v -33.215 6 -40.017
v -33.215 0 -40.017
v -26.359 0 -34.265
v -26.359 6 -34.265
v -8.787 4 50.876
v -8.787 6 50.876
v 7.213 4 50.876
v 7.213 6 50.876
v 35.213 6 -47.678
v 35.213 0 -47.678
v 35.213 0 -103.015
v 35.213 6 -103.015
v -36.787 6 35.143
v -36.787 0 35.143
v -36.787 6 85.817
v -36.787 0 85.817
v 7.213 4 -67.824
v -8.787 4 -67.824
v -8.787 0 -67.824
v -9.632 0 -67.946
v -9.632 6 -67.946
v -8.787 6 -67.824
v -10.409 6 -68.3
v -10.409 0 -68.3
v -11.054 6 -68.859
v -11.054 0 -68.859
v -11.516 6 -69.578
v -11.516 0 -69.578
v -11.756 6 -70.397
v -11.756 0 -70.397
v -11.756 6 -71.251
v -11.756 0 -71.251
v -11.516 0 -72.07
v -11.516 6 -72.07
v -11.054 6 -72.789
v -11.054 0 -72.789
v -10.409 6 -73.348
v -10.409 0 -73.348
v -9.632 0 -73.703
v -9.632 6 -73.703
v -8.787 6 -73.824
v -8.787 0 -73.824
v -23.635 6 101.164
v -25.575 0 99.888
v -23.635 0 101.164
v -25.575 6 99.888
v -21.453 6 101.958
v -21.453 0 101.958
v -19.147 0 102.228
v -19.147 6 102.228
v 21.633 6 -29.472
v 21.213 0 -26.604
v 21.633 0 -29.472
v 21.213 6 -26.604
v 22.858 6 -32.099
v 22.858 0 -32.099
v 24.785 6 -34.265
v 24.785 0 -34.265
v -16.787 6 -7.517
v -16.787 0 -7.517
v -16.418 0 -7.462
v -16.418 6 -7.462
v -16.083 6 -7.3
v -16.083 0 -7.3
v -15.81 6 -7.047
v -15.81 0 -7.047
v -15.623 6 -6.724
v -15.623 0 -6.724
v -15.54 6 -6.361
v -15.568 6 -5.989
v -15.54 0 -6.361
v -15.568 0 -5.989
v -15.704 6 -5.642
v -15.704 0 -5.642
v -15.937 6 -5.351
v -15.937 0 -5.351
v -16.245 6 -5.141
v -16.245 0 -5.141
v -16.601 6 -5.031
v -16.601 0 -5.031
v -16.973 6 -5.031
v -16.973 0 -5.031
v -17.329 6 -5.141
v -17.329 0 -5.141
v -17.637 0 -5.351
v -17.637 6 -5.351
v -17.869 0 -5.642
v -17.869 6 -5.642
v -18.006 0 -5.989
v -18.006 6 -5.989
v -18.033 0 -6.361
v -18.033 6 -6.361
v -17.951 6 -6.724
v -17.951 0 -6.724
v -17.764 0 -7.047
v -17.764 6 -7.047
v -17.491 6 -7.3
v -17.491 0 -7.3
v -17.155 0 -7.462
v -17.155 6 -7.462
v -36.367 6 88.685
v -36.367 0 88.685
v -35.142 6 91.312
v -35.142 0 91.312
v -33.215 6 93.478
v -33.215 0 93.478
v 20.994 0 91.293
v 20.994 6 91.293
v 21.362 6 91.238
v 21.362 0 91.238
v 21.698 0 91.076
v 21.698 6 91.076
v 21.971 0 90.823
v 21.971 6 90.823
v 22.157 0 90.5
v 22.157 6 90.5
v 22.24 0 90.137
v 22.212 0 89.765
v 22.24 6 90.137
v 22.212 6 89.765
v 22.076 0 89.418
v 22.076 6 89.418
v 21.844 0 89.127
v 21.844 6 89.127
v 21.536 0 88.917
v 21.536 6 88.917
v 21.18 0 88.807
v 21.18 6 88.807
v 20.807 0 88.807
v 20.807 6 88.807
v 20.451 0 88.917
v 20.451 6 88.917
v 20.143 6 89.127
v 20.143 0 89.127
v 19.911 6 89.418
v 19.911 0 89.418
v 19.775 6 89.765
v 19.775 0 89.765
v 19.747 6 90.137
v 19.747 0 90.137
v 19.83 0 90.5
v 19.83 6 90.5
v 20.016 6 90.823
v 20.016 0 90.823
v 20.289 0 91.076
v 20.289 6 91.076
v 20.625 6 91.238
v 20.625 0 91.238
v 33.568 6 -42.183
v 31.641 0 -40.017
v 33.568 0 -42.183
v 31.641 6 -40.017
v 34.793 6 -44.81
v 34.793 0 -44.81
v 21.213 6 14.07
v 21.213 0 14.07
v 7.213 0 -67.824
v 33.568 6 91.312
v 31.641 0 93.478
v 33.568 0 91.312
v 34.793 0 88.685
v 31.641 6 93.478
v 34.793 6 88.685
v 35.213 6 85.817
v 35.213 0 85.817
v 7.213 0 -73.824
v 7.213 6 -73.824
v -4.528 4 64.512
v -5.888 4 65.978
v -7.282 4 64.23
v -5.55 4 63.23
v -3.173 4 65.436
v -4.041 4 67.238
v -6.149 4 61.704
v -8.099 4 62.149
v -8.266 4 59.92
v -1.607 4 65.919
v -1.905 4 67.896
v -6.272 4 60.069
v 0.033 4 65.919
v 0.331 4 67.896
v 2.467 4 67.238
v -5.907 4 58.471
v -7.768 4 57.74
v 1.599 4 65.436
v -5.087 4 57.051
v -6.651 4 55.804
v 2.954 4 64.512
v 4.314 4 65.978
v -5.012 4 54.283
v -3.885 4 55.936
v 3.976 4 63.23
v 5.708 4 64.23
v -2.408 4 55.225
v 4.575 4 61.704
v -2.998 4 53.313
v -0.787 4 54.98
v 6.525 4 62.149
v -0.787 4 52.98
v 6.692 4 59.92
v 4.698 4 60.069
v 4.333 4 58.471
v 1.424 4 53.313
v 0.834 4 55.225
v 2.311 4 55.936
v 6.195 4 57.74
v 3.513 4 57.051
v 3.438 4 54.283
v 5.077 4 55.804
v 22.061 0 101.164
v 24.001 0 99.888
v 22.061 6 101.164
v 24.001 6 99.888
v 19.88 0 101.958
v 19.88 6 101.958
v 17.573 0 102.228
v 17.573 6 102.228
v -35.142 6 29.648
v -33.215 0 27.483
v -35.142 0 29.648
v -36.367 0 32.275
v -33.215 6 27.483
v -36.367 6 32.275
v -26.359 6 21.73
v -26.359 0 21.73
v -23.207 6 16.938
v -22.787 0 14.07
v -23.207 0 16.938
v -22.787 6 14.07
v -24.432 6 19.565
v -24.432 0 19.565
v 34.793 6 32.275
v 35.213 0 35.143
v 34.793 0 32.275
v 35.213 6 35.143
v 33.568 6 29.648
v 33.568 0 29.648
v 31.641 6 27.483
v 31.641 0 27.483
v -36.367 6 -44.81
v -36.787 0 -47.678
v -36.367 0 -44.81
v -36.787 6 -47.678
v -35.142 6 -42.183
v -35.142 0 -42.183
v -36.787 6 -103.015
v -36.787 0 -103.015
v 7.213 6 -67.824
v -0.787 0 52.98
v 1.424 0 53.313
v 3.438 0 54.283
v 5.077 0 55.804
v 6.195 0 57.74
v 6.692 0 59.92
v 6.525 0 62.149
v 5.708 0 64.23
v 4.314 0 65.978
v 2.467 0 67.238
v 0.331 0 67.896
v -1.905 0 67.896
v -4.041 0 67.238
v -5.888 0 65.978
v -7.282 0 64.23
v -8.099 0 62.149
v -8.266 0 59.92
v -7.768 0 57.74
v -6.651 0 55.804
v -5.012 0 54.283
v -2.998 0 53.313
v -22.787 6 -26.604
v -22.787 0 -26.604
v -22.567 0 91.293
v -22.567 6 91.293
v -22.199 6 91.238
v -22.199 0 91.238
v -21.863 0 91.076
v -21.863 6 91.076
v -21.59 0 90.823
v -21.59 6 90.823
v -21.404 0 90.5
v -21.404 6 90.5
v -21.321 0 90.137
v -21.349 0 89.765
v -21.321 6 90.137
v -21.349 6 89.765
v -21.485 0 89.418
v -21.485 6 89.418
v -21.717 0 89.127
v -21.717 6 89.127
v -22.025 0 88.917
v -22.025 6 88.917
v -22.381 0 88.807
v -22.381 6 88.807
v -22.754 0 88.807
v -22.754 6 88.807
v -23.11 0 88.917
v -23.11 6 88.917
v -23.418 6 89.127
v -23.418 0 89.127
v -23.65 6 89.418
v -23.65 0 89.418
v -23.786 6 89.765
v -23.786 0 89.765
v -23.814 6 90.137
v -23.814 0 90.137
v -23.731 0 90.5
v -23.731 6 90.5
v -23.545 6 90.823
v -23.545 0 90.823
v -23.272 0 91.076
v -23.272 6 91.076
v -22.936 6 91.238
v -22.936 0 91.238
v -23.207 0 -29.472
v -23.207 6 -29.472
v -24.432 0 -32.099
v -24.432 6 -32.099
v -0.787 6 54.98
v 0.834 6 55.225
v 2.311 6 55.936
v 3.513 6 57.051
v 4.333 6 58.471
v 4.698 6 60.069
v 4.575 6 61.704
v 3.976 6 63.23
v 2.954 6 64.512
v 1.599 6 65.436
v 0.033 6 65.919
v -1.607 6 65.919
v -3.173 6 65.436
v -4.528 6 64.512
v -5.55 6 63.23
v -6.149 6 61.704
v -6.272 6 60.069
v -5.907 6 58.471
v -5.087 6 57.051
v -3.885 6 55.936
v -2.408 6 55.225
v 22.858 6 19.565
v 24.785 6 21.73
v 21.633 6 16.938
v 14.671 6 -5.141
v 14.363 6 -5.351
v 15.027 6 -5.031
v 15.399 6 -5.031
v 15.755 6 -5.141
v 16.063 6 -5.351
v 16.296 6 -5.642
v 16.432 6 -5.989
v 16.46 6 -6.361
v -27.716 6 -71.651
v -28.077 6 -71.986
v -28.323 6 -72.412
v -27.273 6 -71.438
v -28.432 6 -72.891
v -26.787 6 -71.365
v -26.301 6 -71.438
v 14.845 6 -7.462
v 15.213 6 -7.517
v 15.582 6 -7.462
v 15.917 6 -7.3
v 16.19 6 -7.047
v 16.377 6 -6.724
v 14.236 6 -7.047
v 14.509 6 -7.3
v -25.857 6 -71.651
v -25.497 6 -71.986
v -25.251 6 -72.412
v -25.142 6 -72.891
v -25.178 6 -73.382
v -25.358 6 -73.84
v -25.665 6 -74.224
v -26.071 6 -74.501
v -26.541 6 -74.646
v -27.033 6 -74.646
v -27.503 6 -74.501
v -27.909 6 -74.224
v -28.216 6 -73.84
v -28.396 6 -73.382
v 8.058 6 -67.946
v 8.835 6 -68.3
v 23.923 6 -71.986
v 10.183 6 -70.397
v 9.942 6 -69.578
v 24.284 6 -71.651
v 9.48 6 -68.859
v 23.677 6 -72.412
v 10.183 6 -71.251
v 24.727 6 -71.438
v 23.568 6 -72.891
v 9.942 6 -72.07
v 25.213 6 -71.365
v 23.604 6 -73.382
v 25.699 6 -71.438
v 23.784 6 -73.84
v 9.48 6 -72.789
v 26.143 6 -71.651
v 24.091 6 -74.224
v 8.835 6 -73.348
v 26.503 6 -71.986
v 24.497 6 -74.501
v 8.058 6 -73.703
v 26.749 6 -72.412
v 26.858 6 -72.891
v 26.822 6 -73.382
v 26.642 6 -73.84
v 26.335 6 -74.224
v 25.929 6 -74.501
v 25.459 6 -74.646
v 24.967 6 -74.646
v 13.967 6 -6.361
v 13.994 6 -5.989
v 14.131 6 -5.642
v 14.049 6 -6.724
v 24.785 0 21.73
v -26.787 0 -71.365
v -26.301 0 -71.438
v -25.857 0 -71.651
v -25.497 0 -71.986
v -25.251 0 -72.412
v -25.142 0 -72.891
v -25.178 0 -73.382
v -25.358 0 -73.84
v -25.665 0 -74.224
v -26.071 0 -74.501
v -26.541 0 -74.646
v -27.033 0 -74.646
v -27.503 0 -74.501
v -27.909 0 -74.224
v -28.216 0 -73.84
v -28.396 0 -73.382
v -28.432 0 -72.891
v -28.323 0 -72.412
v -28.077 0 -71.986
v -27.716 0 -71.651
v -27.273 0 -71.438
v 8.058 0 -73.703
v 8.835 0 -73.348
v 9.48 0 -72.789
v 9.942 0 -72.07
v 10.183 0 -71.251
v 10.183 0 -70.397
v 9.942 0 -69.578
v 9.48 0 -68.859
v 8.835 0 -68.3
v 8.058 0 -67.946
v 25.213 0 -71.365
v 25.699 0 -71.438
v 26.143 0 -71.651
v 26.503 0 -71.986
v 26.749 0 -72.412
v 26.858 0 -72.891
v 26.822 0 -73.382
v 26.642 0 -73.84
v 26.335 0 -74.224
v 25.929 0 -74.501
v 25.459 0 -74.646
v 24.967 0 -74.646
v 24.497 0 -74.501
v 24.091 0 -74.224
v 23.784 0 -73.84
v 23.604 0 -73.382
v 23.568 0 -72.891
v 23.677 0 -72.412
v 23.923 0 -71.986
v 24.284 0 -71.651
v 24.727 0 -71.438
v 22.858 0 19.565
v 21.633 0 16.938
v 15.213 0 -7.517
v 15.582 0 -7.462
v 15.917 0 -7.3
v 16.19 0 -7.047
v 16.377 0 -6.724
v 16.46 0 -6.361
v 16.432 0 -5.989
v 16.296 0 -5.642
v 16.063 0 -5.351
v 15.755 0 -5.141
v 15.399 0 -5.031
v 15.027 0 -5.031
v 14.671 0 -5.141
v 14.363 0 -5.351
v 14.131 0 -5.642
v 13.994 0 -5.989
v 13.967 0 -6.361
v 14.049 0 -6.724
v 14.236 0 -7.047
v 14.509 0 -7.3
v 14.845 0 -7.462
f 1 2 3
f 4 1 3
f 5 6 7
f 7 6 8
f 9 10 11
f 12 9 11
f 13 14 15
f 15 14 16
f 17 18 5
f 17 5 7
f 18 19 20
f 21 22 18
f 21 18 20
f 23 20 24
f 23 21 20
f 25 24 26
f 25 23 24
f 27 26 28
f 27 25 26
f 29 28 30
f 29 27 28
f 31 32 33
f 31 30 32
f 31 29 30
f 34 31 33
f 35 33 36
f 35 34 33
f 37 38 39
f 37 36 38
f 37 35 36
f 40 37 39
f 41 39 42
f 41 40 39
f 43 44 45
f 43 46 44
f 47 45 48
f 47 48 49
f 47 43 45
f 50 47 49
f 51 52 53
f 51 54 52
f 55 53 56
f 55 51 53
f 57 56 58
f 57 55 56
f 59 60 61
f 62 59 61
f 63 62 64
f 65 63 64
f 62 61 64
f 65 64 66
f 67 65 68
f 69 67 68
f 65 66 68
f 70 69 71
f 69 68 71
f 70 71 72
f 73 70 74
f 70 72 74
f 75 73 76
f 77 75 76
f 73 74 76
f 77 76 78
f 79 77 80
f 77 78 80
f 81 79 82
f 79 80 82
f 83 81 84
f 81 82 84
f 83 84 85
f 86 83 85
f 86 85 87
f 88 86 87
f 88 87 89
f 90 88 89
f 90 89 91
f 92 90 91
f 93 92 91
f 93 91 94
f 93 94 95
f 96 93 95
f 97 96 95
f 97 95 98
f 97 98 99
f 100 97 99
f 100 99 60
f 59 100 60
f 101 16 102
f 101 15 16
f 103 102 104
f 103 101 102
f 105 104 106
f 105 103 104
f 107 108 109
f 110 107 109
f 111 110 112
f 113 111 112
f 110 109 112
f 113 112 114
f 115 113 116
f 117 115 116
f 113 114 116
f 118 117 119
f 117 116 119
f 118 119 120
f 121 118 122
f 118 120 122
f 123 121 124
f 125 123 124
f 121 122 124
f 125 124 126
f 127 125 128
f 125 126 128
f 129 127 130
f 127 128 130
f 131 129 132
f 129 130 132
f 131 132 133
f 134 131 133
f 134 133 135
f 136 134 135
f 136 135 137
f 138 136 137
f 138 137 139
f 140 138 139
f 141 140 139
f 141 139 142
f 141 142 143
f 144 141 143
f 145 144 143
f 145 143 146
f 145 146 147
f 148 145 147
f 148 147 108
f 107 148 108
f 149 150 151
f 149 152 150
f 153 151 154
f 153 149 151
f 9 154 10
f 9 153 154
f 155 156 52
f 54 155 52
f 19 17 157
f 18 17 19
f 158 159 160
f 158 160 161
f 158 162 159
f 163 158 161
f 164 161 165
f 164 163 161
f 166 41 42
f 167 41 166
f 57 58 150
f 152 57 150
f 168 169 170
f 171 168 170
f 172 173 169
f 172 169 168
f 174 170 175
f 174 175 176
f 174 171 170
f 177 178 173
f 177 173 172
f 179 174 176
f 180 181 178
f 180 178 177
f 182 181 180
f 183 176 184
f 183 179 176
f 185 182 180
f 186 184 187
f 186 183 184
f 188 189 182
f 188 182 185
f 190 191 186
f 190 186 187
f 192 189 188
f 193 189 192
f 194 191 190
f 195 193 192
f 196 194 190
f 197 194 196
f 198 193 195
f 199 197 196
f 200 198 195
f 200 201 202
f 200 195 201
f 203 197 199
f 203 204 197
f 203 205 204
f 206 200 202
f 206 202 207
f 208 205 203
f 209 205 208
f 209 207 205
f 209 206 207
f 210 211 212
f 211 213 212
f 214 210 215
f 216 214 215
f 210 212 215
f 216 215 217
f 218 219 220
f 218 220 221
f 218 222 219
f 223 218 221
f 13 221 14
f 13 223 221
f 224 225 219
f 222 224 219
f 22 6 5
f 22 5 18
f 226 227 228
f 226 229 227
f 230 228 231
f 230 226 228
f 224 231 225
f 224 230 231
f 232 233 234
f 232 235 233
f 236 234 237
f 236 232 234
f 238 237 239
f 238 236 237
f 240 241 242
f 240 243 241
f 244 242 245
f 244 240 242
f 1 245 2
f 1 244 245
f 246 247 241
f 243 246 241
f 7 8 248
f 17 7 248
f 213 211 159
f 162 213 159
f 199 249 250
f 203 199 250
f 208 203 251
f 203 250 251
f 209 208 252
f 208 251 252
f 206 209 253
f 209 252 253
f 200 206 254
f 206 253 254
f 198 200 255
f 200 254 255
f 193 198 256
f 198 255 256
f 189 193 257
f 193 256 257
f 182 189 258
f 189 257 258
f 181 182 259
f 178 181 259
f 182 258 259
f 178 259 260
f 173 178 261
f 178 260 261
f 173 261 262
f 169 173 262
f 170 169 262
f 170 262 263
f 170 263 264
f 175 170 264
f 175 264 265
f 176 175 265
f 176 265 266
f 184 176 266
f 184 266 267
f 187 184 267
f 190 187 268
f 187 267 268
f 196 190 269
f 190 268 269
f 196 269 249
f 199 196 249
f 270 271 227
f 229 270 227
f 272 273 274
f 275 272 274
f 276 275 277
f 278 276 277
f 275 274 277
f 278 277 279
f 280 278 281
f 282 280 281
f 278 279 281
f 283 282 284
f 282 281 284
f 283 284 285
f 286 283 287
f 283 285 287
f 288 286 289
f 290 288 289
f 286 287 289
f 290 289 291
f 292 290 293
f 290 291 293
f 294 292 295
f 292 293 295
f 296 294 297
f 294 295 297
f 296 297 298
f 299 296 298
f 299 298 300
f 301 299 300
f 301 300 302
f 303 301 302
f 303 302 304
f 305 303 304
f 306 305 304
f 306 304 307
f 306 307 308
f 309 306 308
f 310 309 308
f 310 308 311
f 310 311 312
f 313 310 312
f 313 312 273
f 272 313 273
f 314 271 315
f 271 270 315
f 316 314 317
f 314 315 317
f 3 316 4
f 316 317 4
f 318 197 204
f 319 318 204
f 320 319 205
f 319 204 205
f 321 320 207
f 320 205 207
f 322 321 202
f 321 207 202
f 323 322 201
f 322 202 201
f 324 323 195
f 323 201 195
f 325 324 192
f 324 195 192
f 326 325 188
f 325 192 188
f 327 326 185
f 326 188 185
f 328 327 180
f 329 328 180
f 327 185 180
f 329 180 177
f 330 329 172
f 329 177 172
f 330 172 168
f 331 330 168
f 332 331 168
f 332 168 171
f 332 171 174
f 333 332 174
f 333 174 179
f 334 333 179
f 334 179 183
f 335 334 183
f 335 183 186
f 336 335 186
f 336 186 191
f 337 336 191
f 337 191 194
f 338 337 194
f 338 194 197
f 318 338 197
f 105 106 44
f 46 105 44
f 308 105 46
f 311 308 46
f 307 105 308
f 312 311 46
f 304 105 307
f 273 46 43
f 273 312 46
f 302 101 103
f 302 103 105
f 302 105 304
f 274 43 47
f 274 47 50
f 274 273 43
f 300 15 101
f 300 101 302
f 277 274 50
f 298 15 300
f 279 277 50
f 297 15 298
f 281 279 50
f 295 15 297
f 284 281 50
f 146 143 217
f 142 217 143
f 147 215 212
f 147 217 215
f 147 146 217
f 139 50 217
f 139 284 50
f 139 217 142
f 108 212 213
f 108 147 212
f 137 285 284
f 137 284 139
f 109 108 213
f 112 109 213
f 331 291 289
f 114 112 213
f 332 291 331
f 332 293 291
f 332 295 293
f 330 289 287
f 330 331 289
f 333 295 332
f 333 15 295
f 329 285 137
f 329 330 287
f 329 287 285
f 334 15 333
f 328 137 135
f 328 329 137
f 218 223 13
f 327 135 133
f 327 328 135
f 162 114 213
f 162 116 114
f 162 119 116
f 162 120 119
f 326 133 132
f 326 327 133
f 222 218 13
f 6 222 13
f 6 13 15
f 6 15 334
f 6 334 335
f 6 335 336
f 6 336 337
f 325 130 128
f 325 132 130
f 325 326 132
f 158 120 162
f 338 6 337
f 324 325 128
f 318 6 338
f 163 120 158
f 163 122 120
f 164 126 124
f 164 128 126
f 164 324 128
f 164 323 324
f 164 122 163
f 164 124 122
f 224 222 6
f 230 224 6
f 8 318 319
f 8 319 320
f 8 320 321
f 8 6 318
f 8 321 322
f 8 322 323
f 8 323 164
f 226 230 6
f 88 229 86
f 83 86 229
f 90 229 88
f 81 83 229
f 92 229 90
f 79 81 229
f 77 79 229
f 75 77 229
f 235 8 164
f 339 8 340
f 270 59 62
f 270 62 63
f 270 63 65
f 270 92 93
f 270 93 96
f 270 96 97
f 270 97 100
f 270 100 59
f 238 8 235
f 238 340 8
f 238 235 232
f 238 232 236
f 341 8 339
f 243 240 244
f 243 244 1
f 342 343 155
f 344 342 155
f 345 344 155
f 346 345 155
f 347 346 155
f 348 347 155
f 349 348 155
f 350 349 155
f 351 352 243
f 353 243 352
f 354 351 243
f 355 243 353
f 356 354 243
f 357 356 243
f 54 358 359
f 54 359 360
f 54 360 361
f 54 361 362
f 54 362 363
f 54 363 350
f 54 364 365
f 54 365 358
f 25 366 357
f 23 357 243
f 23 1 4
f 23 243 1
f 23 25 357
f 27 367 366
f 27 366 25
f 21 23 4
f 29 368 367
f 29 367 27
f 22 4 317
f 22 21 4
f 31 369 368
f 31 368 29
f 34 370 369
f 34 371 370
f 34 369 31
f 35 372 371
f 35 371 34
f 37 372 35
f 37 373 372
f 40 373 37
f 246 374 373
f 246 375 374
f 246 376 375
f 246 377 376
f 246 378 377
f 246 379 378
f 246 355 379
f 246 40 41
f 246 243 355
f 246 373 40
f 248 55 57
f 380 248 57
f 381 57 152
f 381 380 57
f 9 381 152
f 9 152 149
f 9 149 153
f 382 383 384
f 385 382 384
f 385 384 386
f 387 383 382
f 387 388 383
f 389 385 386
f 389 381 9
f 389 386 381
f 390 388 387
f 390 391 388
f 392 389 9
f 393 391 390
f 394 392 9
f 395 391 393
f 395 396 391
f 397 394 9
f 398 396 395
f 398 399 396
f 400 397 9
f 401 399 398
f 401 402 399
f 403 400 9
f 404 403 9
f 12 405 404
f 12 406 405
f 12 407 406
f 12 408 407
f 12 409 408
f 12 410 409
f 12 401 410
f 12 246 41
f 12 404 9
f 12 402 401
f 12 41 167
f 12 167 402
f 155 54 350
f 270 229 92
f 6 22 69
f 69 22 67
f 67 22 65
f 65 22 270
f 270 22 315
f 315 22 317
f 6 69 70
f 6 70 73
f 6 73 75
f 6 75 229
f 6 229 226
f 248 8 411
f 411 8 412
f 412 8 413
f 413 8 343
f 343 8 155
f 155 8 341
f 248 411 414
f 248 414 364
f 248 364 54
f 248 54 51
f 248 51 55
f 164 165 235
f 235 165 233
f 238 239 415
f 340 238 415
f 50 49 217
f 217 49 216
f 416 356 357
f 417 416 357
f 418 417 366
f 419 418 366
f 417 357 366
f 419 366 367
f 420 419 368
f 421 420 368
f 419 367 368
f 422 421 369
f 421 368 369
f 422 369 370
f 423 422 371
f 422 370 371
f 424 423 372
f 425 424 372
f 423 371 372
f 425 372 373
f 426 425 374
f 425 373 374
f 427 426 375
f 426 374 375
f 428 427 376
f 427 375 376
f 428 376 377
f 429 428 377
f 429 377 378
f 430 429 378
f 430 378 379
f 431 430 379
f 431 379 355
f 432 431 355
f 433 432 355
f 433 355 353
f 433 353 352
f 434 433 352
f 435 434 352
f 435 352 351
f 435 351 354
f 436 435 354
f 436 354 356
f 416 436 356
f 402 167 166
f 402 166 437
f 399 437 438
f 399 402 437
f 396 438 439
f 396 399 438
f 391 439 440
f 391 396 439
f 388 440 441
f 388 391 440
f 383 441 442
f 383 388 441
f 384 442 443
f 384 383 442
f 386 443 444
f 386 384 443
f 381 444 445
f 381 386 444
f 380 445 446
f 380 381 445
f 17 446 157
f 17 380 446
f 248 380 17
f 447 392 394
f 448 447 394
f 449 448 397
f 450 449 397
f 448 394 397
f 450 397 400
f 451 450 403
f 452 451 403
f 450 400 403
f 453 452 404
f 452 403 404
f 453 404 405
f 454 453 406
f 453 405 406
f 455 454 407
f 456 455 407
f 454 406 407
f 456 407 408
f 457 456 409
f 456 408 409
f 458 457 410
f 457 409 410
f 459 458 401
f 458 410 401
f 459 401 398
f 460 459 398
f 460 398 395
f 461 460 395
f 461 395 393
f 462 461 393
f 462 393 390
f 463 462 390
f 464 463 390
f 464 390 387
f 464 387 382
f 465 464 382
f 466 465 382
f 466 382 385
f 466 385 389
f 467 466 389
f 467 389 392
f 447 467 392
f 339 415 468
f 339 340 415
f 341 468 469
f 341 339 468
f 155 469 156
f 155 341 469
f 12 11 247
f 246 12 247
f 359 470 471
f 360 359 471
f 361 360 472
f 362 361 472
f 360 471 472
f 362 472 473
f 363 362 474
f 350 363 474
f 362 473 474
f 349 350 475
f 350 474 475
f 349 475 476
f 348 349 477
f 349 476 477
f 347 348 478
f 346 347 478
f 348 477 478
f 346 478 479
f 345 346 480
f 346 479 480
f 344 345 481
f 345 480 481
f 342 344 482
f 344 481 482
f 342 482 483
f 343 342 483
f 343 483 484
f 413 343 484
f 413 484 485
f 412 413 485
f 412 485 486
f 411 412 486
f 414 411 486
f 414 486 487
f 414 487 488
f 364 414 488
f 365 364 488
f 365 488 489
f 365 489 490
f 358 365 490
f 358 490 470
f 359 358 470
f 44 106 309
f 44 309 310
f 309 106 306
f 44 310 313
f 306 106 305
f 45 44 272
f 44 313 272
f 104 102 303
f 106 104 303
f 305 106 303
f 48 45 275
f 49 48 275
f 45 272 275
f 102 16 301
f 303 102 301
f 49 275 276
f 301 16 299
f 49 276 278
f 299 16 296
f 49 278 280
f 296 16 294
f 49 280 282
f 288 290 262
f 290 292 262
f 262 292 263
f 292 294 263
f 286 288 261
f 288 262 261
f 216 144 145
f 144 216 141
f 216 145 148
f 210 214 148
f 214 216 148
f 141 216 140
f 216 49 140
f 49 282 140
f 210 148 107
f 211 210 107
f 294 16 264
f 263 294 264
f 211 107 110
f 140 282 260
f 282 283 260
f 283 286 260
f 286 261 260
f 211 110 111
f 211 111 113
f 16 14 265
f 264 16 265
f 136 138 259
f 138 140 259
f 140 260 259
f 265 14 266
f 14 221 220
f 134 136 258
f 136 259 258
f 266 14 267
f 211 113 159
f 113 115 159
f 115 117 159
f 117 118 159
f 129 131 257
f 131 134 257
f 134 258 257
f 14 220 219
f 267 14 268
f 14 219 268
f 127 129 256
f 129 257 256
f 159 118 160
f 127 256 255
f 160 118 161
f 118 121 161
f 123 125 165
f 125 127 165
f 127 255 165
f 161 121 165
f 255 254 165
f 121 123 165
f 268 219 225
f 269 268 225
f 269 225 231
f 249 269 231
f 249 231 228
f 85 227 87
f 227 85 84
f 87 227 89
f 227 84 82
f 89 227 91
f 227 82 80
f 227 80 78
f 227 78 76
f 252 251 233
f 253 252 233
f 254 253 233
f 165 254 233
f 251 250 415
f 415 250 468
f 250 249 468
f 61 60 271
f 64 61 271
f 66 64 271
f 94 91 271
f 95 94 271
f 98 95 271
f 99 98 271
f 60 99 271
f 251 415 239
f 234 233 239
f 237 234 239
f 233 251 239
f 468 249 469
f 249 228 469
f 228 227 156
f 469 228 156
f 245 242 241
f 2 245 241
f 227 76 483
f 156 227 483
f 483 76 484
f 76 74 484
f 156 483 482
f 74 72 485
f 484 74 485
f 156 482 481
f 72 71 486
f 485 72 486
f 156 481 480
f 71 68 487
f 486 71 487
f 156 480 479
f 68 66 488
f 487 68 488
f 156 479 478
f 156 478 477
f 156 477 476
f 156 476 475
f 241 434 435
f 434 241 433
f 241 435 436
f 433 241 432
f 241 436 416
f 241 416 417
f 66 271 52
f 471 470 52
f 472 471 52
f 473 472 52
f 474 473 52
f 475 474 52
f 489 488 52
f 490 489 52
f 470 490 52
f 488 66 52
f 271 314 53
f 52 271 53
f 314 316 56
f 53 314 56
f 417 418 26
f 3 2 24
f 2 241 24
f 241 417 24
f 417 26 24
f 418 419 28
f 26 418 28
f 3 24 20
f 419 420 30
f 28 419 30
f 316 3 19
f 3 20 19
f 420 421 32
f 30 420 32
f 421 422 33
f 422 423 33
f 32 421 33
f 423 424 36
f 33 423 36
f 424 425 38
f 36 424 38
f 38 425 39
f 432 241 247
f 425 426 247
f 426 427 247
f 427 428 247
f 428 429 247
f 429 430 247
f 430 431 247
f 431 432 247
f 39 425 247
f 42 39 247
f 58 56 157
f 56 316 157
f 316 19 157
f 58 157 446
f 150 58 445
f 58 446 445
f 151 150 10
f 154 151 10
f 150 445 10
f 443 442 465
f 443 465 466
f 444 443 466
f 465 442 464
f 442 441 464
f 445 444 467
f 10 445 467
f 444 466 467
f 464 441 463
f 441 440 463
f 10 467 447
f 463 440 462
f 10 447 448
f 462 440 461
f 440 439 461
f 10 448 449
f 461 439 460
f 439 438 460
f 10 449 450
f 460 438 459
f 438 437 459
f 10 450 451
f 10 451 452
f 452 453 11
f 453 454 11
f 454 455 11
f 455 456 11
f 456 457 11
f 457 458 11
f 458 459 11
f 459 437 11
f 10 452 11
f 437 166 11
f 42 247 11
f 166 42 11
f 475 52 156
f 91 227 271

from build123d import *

# Parameters (mm, degrees)
BOSS_EXTRUDE1_DEPTH = 6
FILLET1_R           = 10
SKETCH2_R           = 2.5
CUT_EXTRUDE1_DEPTH  = 6
SKETCH5_R           = 7.5
CUT_EXTRUDE3_DEPTH  = 4
SKETCH6_R           = 5.5
CUT_EXTRUDE4_DEPTH  = 4
SKETCH8_W           = 16
SKETCH8_H           = 121.699623713
CUT_EXTRUDE5_DEPTH  = 2
FILLET2_R           = 10
CUT_EXTRUDE6_DEPTH  = 10
SKETCH10_R          = 1.25
CUT_EXTRUDE7_DEPTH  = 10
SKETCH11_R          = 1.25
CUT_EXTRUDE8_DEPTH  = 10
SKETCH12_R          = 1.65
CUT_EXTRUDE9_DEPTH  = 10


with BuildPart() as part:
    # Sketch1 → Boss-Extrude1 (new body)
    with BuildSketch(Plane(origin=(0, 0, 0), x_dir=(1, 0, 0), z_dir=(0, 1, 0))):
        Polygon((21.213083016, -102.227633762), (35.213083016, -90.480238926), (35.213083016, -30.480238926), (21.213083016, -18.73284409), (21.213083016, 31.26715591), (35.213083016, 43.014550747), (35.213083016, 103.014550747), (-36.786916984, 103.014550747), (-36.786916984, 43.014550747), (-22.786916984, 31.26715591), (-22.786916984, -18.73284409), (-36.786916984, -30.480238926), (-36.786916984, -90.480238926), (-22.786916984, -102.227633762), align=None)
    extrude(amount=BOSS_EXTRUDE1_DEPTH)

    # Fillet1
    fillet1_edges = [part.edges().sort_by_distance(p)[0] for p in [
        (-22.786916984, 3, 102.227633762),
        (-36.786916984, 3, 90.480238926),
        (-36.786916984, 3, 30.480238926),
        (-22.786916984, 3, 18.73284409),
        (21.213083016, 3, 18.73284409),
        (35.213083016, 3, 30.480238926),
        (35.213083016, 3, 90.480238926),
        (21.213083016, 3, 102.227633762),
    ]]
    fillet(fillet1_edges, radius=FILLET1_R)

    # Sketch2 → Cut-Extrude1 (cut)
    with BuildSketch(Plane.XZ):
        with Locations(Location((-0.786916984, 60.480238926, 0), (0, 0, 270))):
            Circle(SKETCH2_R)
    extrude(amount=-CUT_EXTRUDE1_DEPTH, mode=Mode.SUBTRACT)

    # Sketch5 → Cut-Extrude3 (cut)
    with BuildSketch(Plane.XZ):
        with Locations(Location((-0.786916984, 60.480238926, 0), (0, 0, 270))):
            Circle(SKETCH5_R)
    extrude(amount=-CUT_EXTRUDE3_DEPTH, mode=Mode.SUBTRACT)

    # Sketch6 → Cut-Extrude4 (cut)
    with BuildSketch(Plane.XZ.offset(-4)):
        with Locations(Location((-0.786916984, 60.480238926, 0), (0, 0, 270))):
            Circle(SKETCH6_R)
    extrude(amount=-CUT_EXTRUDE4_DEPTH, mode=Mode.SUBTRACT)

    # Sketch8 → Cut-Extrude5 (cut)
    with BuildSketch(Plane(origin=(0, 6, 0), x_dir=(1, 0, 0), z_dir=(0, 1, 0))):
        with Locations((-0.786916984, 9.974259286)):
            Rectangle(SKETCH8_W, SKETCH8_H)
    extrude(amount=-CUT_EXTRUDE5_DEPTH, mode=Mode.SUBTRACT)

    # Fillet2
    fillet2_edges = [part.edges().sort_by_distance(p)[0] for p in [
        (-22.786916984, 3, -31.26715591),
        (-36.786916984, 3, -43.014550747),
        (35.213083016, 3, -43.014550747),
        (21.213083016, 3, -31.26715591),
    ]]
    fillet(fillet2_edges, radius=FILLET2_R)

    # Sketch9 → Cut-Extrude6 (cut)
    with BuildSketch(Plane(origin=(0, 6, 0), x_dir=(1, 0, 0), z_dir=(0, 1, 0))):
        with BuildLine():
            Line((7.213083016, 67.824071143), (-8.786916984, 67.824071143))
            ThreePointArc((-8.786916984, 67.824071143), (-11.786916984, 70.824071143), (-8.786916984, 73.824071143))
            Line((-8.786916984, 73.824071143), (7.213083016, 73.824071143))
            ThreePointArc((7.213083016, 73.824071143), (10.213083016, 70.824071143), (7.213083016, 67.824071143))
        make_face()
    extrude(amount=-CUT_EXTRUDE6_DEPTH, mode=Mode.SUBTRACT)

    # Sketch10 → Cut-Extrude7 (cut)
    with BuildSketch(Plane.XZ):
        with Locations(Location((-16.786916984, -6.26715591, 0), (0, 0, 270))):
            Circle(SKETCH10_R)
        with Locations(Location((15.213083016, -6.26715591, 0), (0, 0, 270))):
            Circle(SKETCH10_R)
    extrude(amount=-CUT_EXTRUDE7_DEPTH, mode=Mode.SUBTRACT)

    # Sketch11 → Cut-Extrude8 (cut)
    with BuildSketch(Plane(origin=(0, 6, 0), x_dir=(1, 0, 0), z_dir=(0, 1, 0))):
        with Locations(Location((20.993582106, -90.043344962, 0), (0, 0, 270))):
            Circle(SKETCH11_R)
        with Locations(Location((-22.567416075, -90.043344962, 0), (0, 0, 270))):
            Circle(SKETCH11_R)
    extrude(amount=-CUT_EXTRUDE8_DEPTH, mode=Mode.SUBTRACT)

    # Sketch12 → Cut-Extrude9 (cut)
    with BuildSketch(Plane(origin=(0, 6, 0), x_dir=(1, 0, 0), z_dir=(0, 1, 0))):
        with Locations(Location((25.213083016, 73.014550747, 0), (0, 0, 270))):
            Circle(SKETCH12_R)
        with Locations(Location((-26.786916984, 73.014550747, 0), (0, 0, 270))):
            Circle(SKETCH12_R)
    extrude(amount=-CUT_EXTRUDE9_DEPTH, mode=Mode.SUBTRACT)


solid = part.part
